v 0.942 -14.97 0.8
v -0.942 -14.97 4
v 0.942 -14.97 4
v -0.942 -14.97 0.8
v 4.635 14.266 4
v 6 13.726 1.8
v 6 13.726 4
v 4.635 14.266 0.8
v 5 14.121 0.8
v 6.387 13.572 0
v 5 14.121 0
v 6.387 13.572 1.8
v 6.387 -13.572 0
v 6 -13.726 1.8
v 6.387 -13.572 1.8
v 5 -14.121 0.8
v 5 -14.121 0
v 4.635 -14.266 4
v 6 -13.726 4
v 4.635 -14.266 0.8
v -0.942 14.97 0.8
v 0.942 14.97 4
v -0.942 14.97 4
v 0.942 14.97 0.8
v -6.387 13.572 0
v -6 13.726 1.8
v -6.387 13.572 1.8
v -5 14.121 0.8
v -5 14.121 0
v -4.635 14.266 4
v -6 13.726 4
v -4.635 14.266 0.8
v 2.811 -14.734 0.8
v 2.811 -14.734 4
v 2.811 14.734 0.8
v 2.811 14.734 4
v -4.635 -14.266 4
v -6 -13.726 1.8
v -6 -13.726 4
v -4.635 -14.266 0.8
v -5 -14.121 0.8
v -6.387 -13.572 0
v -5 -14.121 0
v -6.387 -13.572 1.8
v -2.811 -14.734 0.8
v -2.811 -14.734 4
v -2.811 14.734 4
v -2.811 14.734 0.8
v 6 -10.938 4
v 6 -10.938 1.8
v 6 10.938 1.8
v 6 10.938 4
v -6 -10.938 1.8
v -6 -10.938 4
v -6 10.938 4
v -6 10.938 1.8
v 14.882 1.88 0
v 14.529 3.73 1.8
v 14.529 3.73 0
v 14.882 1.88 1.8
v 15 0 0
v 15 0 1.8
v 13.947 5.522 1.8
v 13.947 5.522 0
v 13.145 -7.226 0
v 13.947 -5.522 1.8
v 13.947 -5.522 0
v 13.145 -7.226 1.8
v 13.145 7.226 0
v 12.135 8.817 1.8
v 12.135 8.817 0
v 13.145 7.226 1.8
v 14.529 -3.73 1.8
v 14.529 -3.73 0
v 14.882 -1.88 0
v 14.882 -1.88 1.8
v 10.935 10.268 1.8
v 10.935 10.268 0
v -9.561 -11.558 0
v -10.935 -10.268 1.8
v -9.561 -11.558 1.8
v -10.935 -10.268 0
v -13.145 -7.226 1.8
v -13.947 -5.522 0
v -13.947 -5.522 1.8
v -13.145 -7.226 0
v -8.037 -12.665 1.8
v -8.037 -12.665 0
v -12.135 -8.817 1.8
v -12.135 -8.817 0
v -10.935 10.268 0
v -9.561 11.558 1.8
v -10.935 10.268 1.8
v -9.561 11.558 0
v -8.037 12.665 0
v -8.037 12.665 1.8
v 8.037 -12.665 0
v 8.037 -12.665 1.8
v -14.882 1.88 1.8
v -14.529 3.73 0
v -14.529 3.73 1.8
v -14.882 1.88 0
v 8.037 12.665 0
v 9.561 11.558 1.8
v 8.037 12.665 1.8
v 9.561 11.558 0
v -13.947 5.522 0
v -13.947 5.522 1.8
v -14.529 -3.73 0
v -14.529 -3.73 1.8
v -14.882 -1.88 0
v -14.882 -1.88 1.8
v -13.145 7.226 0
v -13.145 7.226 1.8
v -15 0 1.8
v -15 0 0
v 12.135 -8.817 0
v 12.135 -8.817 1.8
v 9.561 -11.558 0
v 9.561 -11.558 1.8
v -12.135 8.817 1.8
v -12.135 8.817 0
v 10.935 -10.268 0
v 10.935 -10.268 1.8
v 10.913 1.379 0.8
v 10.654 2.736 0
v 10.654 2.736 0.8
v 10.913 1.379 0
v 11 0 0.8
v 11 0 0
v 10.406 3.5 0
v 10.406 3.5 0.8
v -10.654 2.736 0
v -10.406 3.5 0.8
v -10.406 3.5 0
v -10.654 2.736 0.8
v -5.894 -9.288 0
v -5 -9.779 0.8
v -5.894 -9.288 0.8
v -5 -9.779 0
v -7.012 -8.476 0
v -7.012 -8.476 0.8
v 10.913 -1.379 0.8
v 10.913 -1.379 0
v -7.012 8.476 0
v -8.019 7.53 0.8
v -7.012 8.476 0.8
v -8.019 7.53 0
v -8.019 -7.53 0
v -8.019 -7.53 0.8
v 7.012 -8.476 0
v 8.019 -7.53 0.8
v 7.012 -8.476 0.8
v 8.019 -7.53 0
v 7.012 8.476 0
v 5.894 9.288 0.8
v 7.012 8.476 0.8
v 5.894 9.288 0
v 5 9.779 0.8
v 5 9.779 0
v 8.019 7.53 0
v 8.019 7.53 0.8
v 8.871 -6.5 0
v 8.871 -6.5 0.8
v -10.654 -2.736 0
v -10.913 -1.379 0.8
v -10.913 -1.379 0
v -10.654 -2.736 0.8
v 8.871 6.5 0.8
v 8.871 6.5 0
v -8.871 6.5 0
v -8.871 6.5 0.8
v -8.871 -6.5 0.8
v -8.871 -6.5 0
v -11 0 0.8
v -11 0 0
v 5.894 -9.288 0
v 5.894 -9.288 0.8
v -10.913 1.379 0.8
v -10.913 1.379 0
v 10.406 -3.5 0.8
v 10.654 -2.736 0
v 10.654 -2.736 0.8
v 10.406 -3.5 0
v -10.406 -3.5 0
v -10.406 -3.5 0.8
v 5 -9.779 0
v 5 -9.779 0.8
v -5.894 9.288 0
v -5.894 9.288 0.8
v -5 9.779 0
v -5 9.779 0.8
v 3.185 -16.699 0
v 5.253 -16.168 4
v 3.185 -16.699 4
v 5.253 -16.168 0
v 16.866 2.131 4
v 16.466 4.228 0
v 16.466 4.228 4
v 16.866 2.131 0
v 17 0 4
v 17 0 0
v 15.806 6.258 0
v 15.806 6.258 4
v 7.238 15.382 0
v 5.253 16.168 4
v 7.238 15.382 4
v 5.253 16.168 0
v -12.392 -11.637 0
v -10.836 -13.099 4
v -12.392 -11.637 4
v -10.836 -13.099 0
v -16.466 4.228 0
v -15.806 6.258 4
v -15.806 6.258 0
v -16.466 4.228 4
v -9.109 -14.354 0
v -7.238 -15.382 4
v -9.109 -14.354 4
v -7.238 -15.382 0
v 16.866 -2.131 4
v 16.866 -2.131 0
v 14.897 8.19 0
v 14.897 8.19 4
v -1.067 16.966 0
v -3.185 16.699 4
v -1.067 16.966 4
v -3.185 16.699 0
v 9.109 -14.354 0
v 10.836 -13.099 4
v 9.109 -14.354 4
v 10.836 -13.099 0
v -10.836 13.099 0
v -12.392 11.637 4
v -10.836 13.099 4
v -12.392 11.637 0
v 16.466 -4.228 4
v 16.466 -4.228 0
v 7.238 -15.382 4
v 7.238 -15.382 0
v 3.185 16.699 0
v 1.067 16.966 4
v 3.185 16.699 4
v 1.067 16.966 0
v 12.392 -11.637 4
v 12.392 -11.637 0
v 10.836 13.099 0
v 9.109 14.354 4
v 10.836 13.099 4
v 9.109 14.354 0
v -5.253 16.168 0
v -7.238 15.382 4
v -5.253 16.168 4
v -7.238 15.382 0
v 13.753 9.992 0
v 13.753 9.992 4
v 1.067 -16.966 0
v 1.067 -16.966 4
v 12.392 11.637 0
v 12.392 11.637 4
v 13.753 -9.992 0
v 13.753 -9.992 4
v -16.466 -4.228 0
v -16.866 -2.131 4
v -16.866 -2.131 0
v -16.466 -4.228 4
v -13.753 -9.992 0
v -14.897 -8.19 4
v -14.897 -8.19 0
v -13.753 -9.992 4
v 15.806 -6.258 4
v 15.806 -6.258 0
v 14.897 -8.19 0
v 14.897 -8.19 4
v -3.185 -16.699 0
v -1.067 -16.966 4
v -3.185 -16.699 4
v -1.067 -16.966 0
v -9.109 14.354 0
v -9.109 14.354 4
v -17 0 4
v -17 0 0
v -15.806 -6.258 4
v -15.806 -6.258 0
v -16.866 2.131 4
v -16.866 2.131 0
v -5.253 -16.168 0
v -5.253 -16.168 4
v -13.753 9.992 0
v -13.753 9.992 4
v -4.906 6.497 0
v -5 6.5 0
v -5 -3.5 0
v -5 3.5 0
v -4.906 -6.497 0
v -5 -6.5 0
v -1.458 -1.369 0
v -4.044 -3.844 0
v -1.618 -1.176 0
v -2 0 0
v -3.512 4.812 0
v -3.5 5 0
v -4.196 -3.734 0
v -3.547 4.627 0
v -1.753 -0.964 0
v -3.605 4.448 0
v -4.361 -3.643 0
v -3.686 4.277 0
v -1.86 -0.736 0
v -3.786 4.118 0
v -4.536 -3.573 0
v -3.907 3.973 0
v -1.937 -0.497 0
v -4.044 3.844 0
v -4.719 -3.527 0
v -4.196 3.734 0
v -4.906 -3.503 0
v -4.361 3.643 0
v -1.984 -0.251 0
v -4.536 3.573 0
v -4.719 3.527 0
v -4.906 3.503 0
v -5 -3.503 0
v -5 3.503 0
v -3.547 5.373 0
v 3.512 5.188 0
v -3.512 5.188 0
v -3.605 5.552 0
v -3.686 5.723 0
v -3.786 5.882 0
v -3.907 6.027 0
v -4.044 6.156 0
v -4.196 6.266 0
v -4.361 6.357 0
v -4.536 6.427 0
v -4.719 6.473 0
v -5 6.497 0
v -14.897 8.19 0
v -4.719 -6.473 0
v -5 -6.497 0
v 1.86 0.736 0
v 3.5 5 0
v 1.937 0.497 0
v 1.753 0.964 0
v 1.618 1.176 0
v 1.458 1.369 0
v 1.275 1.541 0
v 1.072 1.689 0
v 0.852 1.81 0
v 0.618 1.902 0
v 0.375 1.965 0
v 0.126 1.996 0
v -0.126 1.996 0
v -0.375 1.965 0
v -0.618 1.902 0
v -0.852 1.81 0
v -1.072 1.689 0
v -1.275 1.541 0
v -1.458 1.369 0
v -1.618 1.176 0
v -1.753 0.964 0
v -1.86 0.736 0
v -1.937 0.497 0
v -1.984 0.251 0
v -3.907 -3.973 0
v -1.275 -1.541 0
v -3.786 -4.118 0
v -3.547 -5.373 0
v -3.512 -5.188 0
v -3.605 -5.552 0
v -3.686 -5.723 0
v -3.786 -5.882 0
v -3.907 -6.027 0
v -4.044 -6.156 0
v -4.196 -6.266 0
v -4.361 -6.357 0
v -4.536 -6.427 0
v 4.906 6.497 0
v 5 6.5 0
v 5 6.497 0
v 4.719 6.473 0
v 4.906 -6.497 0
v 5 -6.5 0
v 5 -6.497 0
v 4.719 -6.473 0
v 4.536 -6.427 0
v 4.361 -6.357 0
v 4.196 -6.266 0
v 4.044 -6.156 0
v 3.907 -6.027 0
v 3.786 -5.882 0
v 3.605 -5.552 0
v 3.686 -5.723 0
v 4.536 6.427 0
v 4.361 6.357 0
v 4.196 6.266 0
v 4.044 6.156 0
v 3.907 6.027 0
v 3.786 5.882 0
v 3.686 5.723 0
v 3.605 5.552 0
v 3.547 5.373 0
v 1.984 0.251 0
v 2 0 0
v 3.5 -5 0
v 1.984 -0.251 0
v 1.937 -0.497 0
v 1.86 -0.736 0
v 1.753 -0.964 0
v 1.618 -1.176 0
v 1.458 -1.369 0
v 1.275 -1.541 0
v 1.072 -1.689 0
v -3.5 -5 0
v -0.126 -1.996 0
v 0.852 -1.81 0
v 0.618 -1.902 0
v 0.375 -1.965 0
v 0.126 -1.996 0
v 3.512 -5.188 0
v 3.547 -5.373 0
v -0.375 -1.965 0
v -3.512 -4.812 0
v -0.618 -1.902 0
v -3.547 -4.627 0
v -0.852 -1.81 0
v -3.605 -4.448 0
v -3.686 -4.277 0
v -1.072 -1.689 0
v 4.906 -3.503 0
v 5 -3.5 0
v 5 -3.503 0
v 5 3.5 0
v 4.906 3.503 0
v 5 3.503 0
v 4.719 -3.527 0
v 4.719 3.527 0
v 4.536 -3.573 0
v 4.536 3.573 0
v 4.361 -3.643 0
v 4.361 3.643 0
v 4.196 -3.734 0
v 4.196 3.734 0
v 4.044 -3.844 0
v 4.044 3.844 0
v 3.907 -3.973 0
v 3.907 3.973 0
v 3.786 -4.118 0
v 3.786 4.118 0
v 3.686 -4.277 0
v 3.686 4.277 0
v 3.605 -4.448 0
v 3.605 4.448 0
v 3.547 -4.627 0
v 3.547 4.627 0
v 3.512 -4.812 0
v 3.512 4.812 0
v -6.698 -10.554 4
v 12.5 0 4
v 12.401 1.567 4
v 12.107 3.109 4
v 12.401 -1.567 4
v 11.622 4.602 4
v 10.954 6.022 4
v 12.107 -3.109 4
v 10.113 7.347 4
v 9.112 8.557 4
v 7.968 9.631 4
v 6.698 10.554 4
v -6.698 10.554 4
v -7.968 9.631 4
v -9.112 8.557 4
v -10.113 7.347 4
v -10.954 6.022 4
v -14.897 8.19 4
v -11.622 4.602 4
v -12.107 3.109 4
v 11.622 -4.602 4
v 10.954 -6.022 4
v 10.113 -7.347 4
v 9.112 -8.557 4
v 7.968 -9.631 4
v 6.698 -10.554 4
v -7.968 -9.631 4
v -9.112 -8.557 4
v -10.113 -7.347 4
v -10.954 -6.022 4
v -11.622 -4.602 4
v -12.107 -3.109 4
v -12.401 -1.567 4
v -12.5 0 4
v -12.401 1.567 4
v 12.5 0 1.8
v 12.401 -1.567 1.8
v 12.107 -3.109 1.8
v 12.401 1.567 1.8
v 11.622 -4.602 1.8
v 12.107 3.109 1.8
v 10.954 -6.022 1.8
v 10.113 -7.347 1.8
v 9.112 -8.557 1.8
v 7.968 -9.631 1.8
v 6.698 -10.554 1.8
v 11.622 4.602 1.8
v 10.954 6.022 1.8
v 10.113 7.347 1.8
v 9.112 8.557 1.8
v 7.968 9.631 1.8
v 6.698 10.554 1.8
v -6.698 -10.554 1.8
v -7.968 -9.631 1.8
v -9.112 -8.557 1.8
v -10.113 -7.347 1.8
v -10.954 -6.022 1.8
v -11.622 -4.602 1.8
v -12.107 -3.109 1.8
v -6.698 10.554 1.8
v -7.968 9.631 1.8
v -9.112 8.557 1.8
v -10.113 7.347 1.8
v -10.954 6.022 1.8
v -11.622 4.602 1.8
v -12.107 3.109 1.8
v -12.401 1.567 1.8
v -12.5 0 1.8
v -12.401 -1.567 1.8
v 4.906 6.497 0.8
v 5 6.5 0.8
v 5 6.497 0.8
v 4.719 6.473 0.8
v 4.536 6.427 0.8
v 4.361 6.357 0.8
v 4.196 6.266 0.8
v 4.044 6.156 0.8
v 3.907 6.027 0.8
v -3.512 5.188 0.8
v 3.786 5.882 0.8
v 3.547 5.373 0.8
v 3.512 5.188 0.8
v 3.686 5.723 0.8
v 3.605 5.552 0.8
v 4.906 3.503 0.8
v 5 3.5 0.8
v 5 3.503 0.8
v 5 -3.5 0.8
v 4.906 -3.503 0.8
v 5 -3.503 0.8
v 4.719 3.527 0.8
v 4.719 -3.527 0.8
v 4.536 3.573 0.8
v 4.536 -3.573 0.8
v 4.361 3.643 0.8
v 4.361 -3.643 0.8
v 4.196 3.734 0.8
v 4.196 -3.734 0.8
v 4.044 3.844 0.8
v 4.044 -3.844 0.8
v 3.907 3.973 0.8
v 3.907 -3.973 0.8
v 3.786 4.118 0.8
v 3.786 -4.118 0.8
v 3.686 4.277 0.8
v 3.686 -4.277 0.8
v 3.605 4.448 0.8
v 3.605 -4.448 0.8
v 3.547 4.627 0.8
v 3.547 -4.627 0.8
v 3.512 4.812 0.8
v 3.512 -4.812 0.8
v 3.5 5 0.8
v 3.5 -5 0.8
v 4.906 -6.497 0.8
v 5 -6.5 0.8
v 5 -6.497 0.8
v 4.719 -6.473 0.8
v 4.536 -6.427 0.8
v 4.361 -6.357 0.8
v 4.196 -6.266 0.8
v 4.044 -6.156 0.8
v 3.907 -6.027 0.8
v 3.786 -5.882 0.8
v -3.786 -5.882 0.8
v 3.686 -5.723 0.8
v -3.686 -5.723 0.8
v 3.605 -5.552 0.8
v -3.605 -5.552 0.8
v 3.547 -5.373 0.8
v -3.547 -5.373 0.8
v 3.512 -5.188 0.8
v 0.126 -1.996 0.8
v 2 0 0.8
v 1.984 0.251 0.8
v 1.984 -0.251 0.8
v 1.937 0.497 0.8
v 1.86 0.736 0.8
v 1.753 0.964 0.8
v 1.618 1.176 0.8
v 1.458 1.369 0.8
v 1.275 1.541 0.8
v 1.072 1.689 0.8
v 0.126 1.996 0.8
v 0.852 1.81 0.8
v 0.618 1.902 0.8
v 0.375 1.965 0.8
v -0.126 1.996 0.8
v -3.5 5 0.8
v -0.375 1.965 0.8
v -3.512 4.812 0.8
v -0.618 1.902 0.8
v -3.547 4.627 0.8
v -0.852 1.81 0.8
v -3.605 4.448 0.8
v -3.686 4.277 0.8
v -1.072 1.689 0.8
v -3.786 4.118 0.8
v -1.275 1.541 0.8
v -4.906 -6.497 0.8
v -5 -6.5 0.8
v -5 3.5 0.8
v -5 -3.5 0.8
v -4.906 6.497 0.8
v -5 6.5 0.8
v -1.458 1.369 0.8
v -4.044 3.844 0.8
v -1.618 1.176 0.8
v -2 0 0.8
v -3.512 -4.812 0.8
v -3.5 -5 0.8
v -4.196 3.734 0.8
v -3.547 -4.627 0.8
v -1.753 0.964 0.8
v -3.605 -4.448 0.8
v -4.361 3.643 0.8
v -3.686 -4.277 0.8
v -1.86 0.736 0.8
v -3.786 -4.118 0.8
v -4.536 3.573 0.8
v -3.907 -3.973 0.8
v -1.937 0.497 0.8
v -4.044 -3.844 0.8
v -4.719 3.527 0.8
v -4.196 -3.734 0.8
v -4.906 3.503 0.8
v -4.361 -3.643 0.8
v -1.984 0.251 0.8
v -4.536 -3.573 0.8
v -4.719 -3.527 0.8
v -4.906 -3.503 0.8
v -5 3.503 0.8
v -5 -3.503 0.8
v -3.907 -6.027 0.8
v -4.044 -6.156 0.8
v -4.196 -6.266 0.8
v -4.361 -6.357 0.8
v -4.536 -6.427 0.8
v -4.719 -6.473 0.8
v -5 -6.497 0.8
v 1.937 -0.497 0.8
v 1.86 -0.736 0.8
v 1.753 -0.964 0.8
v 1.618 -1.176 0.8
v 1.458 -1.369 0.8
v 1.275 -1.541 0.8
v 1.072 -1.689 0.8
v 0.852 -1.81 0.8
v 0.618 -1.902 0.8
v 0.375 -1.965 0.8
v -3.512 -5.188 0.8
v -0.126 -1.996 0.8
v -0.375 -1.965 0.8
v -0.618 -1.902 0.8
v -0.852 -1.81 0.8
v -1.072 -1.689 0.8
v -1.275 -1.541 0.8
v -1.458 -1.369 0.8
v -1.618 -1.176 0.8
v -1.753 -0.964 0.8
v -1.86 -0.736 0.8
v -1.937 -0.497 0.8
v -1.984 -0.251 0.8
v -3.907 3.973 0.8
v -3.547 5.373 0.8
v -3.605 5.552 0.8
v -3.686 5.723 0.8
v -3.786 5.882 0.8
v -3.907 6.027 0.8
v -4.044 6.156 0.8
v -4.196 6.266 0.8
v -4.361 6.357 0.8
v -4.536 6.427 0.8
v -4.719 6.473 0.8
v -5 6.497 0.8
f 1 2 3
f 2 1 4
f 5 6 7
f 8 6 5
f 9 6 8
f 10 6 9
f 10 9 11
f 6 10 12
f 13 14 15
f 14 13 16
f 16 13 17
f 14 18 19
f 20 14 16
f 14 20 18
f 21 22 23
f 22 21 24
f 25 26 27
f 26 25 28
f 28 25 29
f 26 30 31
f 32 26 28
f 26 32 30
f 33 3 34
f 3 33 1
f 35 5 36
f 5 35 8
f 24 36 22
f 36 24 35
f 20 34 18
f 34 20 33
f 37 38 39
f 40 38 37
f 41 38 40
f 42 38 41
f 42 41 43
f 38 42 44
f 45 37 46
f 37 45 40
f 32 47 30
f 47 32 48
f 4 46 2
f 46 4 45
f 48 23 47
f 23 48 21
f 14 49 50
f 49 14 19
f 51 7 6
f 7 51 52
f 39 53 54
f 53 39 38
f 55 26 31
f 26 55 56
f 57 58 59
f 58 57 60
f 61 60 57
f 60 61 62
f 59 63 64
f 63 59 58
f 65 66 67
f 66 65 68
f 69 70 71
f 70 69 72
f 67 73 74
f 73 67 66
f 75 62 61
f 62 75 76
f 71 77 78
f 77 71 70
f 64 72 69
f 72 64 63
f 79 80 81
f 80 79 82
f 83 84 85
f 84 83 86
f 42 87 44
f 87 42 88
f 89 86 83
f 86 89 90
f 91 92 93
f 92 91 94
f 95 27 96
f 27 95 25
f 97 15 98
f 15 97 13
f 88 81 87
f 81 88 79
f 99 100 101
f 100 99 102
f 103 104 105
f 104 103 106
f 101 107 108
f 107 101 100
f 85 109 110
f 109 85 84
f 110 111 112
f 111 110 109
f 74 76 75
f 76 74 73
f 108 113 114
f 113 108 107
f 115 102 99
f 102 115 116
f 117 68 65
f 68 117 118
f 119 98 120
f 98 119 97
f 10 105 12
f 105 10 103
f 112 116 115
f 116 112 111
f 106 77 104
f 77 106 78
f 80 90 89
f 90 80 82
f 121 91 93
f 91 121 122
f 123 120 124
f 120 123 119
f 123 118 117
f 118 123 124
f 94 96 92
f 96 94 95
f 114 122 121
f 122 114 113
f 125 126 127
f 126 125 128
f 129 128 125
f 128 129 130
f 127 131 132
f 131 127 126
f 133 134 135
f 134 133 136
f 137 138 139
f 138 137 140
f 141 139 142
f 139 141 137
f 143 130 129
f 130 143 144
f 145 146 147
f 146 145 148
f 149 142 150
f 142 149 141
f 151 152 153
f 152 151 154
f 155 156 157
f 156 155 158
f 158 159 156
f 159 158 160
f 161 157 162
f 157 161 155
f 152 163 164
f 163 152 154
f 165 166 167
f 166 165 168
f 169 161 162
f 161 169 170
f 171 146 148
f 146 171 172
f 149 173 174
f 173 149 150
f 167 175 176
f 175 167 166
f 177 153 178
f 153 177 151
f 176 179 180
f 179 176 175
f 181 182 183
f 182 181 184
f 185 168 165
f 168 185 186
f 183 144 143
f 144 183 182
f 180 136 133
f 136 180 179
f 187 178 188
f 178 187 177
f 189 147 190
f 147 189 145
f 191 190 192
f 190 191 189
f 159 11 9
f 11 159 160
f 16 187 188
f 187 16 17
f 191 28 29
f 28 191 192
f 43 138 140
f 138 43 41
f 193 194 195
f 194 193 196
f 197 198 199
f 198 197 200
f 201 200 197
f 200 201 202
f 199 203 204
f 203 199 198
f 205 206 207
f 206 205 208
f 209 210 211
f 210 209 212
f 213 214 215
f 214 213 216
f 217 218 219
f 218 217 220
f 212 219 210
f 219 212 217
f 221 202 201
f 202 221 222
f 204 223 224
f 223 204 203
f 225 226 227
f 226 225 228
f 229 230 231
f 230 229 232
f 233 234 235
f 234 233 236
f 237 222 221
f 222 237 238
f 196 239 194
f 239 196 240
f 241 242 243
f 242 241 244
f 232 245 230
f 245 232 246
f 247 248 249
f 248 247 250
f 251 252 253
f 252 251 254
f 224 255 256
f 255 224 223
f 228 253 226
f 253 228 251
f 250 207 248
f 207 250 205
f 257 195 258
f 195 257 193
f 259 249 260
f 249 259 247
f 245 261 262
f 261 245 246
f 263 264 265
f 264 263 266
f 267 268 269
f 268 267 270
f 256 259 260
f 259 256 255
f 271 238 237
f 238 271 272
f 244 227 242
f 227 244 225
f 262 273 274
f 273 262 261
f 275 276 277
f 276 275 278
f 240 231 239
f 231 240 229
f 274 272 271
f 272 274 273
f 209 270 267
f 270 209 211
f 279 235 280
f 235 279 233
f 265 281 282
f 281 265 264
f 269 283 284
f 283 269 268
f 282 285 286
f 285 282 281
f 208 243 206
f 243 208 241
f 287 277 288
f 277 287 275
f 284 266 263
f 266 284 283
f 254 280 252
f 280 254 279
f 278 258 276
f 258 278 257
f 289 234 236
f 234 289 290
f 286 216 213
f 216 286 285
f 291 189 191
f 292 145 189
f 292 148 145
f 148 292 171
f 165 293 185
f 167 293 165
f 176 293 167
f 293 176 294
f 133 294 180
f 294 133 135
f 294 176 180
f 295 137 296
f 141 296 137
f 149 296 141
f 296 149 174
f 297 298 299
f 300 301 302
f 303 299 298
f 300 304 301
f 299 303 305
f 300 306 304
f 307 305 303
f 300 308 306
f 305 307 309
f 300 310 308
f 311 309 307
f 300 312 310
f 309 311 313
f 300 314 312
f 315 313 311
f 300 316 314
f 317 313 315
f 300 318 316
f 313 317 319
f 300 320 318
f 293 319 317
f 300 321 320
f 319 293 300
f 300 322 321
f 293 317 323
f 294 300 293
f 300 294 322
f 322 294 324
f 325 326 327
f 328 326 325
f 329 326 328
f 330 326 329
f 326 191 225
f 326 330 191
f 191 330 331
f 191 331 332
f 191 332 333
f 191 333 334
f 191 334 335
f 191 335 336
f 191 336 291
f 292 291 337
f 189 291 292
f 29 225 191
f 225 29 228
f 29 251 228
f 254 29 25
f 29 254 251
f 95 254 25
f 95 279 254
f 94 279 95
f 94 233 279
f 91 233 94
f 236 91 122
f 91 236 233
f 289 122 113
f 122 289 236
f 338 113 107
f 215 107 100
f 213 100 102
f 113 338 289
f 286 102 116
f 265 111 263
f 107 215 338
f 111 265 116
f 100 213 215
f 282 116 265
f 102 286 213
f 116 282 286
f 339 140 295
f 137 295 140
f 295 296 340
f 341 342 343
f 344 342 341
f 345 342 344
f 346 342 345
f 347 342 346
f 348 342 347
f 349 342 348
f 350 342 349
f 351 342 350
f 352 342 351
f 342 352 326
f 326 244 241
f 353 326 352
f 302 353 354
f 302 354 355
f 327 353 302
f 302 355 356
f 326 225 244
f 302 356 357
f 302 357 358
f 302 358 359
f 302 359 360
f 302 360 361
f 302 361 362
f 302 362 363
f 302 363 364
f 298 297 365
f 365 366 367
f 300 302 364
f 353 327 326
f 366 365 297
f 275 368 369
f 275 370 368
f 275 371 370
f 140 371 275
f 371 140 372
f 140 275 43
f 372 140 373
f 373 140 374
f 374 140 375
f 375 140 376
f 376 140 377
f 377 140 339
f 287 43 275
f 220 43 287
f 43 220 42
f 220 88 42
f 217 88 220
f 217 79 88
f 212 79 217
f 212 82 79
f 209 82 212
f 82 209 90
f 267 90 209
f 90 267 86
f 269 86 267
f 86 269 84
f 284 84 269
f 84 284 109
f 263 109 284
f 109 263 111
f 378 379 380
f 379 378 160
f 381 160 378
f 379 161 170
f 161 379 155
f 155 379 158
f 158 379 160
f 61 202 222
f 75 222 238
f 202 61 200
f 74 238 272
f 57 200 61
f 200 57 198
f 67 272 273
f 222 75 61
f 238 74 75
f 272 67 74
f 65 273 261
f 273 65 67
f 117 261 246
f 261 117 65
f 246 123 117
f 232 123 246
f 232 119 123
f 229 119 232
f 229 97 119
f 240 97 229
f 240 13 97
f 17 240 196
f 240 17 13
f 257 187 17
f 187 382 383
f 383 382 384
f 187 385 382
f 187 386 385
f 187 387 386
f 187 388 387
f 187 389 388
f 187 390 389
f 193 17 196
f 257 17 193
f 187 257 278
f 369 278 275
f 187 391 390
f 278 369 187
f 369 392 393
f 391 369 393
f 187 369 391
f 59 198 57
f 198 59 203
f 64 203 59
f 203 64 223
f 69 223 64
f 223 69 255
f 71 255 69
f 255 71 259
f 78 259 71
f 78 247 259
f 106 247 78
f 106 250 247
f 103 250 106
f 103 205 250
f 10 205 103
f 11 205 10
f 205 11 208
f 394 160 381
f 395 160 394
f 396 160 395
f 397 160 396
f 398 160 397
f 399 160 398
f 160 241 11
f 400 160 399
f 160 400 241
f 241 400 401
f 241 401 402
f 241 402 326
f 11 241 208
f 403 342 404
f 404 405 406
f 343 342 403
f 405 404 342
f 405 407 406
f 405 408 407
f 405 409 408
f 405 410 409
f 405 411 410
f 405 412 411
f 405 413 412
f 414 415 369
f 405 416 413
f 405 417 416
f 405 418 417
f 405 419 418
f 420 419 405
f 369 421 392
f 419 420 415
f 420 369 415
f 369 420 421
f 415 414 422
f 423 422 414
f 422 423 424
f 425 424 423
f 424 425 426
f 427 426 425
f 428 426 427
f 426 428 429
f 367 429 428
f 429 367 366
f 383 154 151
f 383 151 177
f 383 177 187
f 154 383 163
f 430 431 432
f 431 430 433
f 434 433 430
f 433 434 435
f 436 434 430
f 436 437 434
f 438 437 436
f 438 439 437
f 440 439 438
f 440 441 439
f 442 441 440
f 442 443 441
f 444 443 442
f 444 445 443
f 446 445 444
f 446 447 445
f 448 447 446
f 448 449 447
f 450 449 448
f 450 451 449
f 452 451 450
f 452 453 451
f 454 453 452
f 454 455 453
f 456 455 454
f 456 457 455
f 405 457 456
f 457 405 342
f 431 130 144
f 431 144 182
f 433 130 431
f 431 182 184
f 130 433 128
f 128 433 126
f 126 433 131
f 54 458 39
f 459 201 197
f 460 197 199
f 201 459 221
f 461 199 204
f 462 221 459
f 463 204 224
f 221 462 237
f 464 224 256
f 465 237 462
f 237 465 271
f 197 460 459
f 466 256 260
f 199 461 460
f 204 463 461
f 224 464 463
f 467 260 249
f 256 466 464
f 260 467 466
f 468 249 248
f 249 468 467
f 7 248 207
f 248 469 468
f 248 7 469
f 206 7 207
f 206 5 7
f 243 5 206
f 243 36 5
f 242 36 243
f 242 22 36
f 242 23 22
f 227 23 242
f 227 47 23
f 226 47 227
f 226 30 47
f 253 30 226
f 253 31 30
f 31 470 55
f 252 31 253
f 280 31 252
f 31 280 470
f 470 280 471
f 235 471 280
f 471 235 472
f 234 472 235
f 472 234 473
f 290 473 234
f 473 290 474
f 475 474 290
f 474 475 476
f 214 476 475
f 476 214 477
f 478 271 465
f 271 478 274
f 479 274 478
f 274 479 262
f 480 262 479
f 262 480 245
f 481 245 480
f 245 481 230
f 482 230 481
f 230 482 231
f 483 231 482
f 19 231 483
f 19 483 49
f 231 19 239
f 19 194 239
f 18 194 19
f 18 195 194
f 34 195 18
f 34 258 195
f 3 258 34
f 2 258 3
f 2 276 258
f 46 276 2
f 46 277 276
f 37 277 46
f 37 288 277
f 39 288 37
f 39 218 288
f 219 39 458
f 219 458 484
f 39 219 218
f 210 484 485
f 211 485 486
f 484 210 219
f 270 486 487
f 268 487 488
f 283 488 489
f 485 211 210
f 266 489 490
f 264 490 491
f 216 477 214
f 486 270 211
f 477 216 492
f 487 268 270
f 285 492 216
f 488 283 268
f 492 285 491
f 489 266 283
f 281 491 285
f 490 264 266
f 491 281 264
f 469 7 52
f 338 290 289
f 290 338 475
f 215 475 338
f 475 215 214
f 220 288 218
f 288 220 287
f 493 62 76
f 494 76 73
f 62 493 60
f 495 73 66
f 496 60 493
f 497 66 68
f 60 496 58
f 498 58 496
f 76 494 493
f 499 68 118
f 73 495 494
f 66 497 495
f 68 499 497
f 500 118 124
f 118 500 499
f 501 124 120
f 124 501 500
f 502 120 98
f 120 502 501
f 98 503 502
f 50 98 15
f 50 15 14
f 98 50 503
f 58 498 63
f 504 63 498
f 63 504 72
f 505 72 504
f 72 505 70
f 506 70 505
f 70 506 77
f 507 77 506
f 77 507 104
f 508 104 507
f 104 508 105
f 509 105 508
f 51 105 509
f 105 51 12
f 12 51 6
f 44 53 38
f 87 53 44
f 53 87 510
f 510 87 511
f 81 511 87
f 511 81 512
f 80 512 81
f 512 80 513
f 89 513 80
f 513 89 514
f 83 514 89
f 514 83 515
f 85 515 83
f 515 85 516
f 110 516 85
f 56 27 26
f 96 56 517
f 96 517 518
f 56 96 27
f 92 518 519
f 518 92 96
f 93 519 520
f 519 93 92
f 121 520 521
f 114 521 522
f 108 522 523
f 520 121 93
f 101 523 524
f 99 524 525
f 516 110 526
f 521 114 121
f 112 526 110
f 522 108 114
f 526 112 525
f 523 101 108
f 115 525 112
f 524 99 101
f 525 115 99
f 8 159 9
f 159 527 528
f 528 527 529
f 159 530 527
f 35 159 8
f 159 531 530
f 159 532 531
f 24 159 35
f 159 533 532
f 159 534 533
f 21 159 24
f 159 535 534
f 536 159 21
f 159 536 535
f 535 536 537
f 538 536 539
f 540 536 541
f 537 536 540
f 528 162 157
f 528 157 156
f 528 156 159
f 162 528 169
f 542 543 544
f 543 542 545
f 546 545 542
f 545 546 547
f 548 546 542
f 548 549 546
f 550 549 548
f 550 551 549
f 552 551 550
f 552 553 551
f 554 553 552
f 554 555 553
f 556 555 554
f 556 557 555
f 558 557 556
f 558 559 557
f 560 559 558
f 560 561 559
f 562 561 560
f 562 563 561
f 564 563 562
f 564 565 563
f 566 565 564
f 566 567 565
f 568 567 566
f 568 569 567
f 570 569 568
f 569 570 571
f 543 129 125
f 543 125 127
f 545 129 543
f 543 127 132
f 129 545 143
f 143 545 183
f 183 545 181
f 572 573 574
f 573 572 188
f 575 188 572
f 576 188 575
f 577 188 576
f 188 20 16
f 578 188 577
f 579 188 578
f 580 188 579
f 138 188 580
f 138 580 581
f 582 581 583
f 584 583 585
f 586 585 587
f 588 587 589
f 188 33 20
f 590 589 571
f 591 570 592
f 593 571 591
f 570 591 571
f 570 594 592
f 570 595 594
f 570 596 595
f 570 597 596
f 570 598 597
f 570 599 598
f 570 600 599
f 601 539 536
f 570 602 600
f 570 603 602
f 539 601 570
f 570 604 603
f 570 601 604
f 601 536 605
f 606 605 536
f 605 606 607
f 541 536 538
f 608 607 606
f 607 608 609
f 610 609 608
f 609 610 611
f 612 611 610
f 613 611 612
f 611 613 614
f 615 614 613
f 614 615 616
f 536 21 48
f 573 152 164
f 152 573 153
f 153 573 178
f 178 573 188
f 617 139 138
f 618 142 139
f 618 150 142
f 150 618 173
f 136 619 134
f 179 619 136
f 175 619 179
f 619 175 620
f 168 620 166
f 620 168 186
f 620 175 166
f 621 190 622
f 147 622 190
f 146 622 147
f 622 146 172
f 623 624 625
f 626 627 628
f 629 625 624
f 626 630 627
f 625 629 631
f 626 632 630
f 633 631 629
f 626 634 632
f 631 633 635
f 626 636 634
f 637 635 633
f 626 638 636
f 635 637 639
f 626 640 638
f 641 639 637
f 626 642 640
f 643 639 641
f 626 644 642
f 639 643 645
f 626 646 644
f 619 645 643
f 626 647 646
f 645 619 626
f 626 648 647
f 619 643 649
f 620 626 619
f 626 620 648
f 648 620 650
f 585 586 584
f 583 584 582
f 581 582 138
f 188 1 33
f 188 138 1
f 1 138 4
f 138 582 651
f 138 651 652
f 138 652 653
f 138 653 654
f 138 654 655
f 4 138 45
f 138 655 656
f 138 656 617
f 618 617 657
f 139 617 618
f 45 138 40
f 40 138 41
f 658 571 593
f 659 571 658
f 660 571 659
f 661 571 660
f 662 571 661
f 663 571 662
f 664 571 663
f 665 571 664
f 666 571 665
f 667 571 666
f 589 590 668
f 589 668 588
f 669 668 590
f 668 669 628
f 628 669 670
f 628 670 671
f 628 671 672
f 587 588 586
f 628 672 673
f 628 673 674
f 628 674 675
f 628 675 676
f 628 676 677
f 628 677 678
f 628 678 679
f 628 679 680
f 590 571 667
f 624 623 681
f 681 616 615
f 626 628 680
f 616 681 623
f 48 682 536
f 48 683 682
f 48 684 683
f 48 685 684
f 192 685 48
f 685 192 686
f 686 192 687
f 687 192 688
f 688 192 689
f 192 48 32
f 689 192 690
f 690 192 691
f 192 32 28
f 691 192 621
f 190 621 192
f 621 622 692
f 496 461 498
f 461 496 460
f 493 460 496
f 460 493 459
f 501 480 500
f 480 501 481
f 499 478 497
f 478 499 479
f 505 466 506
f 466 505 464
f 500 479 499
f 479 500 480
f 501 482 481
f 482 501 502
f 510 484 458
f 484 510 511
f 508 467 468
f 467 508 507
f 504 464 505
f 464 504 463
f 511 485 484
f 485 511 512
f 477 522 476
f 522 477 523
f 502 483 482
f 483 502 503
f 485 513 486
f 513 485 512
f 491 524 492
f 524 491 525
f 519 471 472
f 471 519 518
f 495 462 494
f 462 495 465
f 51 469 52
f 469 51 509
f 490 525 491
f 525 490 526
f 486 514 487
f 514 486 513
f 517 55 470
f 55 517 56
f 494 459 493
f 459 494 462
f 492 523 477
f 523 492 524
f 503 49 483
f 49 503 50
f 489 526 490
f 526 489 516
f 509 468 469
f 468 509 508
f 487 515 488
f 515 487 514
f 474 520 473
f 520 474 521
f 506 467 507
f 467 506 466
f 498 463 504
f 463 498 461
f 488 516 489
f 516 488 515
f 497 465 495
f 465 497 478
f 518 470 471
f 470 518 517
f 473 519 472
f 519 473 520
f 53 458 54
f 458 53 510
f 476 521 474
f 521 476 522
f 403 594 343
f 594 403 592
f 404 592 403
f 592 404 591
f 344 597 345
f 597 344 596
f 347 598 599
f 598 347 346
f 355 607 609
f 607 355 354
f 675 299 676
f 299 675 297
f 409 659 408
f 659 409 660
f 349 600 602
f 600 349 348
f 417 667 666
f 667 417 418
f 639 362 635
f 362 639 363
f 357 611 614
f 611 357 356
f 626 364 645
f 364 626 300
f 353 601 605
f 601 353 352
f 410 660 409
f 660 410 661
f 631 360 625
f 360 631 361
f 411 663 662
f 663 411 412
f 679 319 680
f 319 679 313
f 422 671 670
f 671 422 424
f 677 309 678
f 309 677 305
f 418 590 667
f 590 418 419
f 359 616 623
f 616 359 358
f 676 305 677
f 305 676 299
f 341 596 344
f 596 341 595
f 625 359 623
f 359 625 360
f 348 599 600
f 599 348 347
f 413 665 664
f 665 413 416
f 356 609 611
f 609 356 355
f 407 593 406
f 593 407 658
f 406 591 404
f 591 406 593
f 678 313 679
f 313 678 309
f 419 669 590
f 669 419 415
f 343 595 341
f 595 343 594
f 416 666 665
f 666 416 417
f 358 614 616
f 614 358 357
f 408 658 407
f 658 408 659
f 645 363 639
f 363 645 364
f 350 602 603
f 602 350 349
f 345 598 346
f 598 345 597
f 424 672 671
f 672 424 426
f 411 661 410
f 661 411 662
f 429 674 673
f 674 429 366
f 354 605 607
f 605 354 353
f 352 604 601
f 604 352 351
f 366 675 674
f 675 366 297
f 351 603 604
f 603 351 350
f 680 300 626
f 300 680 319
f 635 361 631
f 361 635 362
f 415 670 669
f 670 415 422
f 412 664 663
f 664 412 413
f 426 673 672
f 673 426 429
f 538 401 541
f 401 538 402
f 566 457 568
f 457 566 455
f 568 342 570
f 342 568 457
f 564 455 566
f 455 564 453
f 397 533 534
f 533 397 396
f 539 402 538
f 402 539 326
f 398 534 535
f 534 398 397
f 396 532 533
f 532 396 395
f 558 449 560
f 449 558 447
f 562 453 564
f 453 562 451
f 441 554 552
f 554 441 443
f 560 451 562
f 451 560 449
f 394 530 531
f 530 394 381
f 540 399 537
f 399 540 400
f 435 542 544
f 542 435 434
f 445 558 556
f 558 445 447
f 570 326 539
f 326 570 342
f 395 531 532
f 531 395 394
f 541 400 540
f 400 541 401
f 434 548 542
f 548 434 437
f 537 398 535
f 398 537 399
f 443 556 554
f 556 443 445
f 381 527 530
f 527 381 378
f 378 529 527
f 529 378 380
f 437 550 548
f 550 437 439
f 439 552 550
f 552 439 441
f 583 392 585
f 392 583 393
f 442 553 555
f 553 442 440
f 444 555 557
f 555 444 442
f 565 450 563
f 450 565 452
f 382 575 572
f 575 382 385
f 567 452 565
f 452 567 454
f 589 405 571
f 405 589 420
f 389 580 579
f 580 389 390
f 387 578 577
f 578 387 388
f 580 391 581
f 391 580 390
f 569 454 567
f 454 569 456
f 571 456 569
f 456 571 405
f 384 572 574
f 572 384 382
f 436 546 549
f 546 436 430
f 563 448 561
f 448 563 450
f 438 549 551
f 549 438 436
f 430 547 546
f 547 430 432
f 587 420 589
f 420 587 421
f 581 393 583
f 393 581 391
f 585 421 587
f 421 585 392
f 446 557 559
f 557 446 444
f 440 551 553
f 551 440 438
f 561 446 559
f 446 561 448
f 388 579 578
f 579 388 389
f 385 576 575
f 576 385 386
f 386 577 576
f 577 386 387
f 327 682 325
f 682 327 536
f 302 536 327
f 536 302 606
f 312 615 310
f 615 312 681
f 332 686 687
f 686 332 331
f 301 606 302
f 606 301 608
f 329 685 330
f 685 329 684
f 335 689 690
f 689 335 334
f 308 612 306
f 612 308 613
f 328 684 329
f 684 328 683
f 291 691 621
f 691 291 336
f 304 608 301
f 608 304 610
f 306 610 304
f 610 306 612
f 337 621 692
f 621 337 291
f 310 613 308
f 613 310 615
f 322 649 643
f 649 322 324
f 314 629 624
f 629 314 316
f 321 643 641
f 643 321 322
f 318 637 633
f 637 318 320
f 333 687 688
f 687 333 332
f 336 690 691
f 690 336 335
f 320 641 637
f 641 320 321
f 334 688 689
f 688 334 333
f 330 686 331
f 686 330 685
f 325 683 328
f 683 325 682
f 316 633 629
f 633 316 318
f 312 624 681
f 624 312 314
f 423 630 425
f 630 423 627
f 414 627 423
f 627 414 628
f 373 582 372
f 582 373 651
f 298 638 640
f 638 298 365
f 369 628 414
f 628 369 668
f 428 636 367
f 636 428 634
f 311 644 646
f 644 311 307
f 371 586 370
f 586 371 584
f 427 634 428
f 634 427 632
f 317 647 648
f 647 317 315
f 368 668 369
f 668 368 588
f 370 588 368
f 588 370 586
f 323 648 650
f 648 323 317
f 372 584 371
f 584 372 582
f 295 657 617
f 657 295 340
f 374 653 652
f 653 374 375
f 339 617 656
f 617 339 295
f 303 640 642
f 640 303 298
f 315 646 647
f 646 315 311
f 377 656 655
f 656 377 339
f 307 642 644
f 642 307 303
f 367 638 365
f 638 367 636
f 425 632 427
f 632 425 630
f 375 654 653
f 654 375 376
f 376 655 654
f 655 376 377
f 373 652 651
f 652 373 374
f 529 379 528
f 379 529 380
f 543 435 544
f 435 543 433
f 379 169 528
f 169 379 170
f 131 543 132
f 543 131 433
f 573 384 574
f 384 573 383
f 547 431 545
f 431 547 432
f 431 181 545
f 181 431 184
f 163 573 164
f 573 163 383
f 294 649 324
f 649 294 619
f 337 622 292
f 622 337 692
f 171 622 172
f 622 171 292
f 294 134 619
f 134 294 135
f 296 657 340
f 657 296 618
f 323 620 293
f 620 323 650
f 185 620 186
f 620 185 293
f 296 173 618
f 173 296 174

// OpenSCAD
$fn=50;

module garmin_mount()
{
	difference()
	{
		cylinder(h=4,d=34);
		translate([0,0,0.8]) cylinder(h=1,d=30);
		translate([0,0,1.01]) cylinder(h=3,d=25);
		translate([0,0,0.8]) intersection()
		{
			cylinder(h=4,d=30);
			translate([0,0,2]) cube([12,31,4], center=true);
		
		}
		translate([0,0,-0.1]) difference()
		{
			cylinder(h=1,d=30);
			translate([0,0,-0.1]) cylinder(h=2,d=22);
			cube([10,34,2], center=true);
		}
		translate([0,0,-0.1]) cylinder(h=1,d=4);
		translate([5,5,-0.1]) cylinder(h=1,d=3);
		translate([5,-5,-0.1]) cylinder(h=1,d=3);
		translate([-5,5,-0.1]) cylinder(h=1,d=3);
		translate([-5,-5,-0.1]) cylinder(h=1,d=3);
		translate([8,5,0.4]) cube([6,3,1], center=true);
		translate([8,-5,0.4]) cube([6,3,1], center=true);
		translate([-8,5,0.4]) cube([6,3,1], center=true);
		translate([-8,-5,0.4]) cube([6,3,1], center=true);
	}
	
}

garmin_mount();
